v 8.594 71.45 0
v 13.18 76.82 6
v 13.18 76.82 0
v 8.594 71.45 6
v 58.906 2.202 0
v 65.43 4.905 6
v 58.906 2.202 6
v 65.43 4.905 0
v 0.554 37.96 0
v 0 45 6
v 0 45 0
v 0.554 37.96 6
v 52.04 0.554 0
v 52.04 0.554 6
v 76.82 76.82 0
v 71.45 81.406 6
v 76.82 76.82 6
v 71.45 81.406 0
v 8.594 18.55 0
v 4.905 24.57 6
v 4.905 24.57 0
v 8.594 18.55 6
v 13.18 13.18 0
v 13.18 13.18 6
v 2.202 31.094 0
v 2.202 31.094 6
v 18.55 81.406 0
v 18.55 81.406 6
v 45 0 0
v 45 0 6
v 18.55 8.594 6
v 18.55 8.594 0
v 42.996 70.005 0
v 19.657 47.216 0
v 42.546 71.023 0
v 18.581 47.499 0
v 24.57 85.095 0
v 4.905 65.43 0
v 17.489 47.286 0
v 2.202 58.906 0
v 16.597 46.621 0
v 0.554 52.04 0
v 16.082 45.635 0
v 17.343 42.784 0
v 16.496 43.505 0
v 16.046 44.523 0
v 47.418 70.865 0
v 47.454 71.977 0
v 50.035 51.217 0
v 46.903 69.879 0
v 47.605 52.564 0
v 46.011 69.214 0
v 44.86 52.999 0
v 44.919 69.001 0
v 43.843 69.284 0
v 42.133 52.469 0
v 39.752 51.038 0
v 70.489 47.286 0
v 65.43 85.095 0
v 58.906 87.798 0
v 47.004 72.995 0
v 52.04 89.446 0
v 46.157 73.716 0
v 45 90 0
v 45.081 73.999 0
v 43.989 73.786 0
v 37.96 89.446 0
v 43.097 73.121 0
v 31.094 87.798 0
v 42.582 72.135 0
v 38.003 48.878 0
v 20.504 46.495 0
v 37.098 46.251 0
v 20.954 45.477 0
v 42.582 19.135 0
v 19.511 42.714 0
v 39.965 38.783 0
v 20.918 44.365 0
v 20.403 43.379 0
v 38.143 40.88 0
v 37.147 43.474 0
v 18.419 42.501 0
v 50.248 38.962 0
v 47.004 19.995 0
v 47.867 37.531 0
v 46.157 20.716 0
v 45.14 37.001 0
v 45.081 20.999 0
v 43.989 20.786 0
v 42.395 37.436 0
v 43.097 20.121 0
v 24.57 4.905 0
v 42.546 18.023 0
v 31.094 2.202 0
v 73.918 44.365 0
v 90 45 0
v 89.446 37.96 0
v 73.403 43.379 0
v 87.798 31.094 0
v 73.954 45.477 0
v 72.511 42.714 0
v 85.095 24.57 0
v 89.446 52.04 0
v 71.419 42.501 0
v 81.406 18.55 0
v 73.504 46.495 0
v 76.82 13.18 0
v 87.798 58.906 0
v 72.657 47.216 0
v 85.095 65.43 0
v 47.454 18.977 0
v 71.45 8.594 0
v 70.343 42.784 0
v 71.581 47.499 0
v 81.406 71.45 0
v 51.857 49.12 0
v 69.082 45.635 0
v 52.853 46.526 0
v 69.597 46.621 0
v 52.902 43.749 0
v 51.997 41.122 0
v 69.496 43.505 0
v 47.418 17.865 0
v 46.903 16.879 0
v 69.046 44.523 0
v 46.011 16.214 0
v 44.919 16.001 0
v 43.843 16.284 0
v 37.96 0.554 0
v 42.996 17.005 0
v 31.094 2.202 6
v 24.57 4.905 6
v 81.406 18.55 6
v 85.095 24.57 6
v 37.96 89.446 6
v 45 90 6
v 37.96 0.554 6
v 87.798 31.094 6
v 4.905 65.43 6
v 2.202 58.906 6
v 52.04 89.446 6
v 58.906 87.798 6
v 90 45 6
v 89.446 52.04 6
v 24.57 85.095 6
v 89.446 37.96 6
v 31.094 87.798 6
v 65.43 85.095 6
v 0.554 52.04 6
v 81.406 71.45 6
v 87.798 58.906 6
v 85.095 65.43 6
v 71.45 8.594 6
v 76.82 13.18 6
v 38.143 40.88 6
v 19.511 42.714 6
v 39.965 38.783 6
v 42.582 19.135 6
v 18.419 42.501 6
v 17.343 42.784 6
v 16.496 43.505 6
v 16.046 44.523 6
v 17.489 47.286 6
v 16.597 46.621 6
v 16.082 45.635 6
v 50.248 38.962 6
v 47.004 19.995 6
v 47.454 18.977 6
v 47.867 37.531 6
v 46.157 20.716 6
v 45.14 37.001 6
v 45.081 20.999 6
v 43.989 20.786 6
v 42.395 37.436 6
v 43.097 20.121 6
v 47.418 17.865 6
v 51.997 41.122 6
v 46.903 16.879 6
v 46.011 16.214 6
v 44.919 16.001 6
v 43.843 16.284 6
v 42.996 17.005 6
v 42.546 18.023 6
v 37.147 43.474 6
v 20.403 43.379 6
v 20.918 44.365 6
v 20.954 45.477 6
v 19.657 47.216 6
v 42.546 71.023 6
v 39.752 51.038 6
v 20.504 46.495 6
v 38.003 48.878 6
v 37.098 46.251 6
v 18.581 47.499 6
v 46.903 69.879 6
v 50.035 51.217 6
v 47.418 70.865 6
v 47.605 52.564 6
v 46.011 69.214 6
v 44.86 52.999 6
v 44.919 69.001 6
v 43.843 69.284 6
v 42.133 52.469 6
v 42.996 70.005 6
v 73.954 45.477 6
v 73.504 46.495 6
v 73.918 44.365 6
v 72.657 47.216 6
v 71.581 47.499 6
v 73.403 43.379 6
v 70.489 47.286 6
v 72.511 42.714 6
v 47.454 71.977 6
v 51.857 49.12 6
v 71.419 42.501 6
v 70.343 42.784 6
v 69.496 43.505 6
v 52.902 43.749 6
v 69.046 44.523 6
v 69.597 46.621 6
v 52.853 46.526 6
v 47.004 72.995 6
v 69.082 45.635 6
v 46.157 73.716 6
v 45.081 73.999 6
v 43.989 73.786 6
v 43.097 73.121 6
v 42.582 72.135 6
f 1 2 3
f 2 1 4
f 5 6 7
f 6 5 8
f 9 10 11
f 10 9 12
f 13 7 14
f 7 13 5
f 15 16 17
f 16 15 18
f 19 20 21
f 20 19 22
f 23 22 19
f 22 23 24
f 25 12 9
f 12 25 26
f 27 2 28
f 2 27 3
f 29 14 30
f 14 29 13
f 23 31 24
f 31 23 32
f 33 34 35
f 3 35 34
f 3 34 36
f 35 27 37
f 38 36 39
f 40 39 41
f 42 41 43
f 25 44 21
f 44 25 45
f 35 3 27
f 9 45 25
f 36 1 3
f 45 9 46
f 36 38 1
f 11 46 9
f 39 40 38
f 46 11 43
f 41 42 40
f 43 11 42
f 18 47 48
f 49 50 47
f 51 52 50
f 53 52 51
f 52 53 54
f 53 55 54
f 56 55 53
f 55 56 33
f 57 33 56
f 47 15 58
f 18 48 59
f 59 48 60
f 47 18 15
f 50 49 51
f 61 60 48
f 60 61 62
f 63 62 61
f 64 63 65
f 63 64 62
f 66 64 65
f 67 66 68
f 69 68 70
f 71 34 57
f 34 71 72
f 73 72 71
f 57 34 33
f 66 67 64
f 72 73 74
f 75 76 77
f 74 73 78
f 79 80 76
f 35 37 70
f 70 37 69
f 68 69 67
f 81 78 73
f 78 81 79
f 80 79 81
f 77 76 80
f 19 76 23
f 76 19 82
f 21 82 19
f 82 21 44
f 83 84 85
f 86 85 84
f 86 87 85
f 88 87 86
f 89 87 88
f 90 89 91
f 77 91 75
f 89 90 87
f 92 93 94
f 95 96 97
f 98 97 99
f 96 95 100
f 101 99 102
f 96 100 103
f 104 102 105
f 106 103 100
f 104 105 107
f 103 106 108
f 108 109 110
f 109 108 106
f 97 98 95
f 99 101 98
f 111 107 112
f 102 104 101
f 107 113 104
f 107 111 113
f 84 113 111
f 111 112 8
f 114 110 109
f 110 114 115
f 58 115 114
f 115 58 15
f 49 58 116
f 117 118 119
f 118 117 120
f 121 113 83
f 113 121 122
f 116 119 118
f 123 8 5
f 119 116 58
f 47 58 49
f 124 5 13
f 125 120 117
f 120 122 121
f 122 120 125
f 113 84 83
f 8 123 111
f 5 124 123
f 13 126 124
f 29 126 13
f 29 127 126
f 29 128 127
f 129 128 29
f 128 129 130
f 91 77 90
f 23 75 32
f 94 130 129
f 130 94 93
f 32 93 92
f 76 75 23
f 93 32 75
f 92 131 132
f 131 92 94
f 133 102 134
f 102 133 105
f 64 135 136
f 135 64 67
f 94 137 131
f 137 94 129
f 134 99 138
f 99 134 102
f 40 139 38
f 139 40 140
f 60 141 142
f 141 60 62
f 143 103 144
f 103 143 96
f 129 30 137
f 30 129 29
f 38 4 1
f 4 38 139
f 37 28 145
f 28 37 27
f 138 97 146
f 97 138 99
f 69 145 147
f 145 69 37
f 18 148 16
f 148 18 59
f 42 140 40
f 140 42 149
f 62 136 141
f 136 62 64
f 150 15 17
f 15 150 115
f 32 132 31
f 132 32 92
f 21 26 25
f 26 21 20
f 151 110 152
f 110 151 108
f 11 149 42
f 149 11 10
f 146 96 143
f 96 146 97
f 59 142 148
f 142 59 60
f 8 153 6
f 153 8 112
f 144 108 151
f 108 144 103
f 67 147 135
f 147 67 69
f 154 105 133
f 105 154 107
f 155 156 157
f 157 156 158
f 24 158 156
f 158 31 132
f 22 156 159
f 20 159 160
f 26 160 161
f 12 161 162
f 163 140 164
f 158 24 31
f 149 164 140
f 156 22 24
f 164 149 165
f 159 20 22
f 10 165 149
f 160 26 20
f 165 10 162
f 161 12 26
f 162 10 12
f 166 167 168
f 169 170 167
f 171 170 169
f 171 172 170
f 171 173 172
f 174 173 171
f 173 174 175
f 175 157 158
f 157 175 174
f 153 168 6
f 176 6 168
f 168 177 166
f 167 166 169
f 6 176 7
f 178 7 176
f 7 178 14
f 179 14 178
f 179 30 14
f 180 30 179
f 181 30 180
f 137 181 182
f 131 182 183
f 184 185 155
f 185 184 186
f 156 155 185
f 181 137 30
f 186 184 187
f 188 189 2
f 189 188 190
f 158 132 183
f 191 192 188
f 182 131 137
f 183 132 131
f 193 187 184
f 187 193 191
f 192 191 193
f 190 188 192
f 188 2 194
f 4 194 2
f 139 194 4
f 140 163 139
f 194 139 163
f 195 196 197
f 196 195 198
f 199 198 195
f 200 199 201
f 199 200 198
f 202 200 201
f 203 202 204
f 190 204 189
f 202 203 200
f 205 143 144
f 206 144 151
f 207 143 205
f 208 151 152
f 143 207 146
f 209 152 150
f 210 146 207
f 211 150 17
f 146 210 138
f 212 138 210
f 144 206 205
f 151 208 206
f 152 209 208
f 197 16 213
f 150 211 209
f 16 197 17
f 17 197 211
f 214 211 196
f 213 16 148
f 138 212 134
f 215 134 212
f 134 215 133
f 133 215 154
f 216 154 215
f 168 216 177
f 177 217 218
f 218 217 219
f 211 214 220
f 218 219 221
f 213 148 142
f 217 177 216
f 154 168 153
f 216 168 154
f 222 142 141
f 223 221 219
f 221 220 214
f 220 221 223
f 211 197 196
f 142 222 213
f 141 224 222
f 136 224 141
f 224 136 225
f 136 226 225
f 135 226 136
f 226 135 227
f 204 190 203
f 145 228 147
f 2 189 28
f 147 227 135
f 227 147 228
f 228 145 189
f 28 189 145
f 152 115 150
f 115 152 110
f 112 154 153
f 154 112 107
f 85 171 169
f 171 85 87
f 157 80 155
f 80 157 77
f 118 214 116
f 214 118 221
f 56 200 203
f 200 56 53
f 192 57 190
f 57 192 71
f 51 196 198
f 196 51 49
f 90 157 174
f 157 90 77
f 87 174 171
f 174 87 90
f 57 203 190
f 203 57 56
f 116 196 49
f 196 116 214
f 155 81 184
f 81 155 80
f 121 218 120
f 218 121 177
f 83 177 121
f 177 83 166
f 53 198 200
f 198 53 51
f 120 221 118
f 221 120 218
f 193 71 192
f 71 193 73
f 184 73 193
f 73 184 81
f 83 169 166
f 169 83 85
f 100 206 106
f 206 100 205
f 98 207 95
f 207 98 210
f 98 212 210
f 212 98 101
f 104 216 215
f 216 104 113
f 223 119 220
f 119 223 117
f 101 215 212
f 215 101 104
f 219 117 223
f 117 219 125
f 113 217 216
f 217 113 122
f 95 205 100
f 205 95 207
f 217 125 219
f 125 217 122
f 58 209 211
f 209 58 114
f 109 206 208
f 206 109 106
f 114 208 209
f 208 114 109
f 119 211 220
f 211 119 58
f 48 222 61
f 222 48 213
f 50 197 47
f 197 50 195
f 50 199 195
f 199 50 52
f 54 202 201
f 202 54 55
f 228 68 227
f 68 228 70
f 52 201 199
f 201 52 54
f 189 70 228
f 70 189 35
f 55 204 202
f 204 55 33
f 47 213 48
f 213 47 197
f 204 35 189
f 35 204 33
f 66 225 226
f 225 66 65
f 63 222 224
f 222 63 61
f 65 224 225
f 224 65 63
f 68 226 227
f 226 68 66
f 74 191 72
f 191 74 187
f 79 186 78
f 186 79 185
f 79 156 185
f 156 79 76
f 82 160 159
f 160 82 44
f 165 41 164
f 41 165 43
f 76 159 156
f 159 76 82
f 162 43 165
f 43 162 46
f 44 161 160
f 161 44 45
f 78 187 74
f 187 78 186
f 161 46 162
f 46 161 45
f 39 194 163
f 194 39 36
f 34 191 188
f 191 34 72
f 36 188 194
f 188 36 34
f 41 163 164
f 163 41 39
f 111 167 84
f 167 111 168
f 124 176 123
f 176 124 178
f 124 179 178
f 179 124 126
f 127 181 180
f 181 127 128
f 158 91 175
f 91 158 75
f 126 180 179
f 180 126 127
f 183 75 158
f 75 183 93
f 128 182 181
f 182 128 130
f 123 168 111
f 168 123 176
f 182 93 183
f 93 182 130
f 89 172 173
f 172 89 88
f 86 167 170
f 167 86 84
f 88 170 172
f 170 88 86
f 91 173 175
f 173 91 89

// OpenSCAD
$fn = 32;

// ----------------------------------------------------------------------
// Spacer plate: round flange R45, 4 bolts
// ----------------------------------------------------------------------

// --- parameters (mm) ---
bore_r = 8;               // centre bore radius
bolt_r = 2.5;             // bolt hole radius
plate_t = 6;              // plate thickness, Z (extrusion height)
flange_r = 45;            // flange radius
n_bolt = 4;               // bolt hole count
ring_r = 26.5;            // bolt circle radius

profile = [[90, 45], [89.446, 52.04], [87.798, 58.906], [85.095, 65.43], [81.406, 71.45], [76.82, 76.82], [71.45, 81.406], [65.43, 85.095], [58.906, 87.798], [52.04, 89.446], [45, 90], [37.96, 89.446], [31.094, 87.798], [24.57, 85.095], [18.55, 81.406], [13.18, 76.82], [8.594, 71.45], [4.905, 65.43], [2.202, 58.906], [0.554, 52.04], [0, 45], [0.554, 37.96], [2.202, 31.094], [4.905, 24.57], [8.594, 18.55], [13.18, 13.18], [18.55, 8.594], [24.57, 4.905], [31.094, 2.202], [37.96, 0.554], [45, 0], [52.04, 0.554], [58.906, 2.202], [65.43, 4.905], [71.45, 8.594], [76.82, 13.18], [81.406, 18.55], [85.095, 24.57], [87.798, 31.094], [89.446, 37.96]];  // primary outline, 40 points, counter clockwise
void_1 = [[52.853, 46.526], [51.857, 49.12], [50.035, 51.217], [47.605, 52.564], [44.86, 52.999], [42.133, 52.469], [39.752, 51.038], [38.003, 48.878], [37.098, 46.251], [37.147, 43.474], [38.143, 40.88], [39.965, 38.783], [42.395, 37.436], [45.14, 37.001], [47.867, 37.531], [50.248, 38.962], [51.997, 41.122], [52.902, 43.749]];  // centre bore, 18 points
void_2 = [[73.954, 45.477], [73.504, 46.495], [72.657, 47.216], [71.581, 47.499], [70.489, 47.286], [69.597, 46.621], [69.082, 45.635], [69.046, 44.523], [69.496, 43.505], [70.343, 42.784], [71.419, 42.501], [72.511, 42.714], [73.403, 43.379], [73.918, 44.365]];  // bolt hole 1, 14 points
void_3 = [[47.454, 71.977], [47.004, 72.995], [46.157, 73.716], [45.081, 73.999], [43.989, 73.786], [43.097, 73.121], [42.582, 72.135], [42.546, 71.023], [42.996, 70.005], [43.843, 69.284], [44.919, 69.001], [46.011, 69.214], [46.903, 69.879], [47.418, 70.865]];  // bolt hole 2, 14 points
void_4 = [[20.954, 45.477], [20.504, 46.495], [19.657, 47.216], [18.581, 47.499], [17.489, 47.286], [16.597, 46.621], [16.082, 45.635], [16.046, 44.523], [16.496, 43.505], [17.343, 42.784], [18.419, 42.501], [19.511, 42.714], [20.403, 43.379], [20.918, 44.365]];  // bolt hole 3, 14 points
void_5 = [[47.454, 18.977], [47.004, 19.995], [46.157, 20.716], [45.081, 20.999], [43.989, 20.786], [43.097, 20.121], [42.582, 19.135], [42.546, 18.023], [42.996, 17.005], [43.843, 16.284], [44.919, 16.001], [46.011, 16.214], [46.903, 16.879], [47.418, 17.865]];  // bolt hole 4, 14 points

// --- the one profile operation ---
difference() {
  linear_extrude(height = plate_t) polygon(points = profile);
  translate([0, 0, -1])
    linear_extrude(height = plate_t + 2) polygon(points = void_1);
  translate([0, 0, -1])
    linear_extrude(height = plate_t + 2) polygon(points = void_2);
  translate([0, 0, -1])
    linear_extrude(height = plate_t + 2) polygon(points = void_3);
  translate([0, 0, -1])
    linear_extrude(height = plate_t + 2) polygon(points = void_4);
  translate([0, 0, -1])
    linear_extrude(height = plate_t + 2) polygon(points = void_5);
}
